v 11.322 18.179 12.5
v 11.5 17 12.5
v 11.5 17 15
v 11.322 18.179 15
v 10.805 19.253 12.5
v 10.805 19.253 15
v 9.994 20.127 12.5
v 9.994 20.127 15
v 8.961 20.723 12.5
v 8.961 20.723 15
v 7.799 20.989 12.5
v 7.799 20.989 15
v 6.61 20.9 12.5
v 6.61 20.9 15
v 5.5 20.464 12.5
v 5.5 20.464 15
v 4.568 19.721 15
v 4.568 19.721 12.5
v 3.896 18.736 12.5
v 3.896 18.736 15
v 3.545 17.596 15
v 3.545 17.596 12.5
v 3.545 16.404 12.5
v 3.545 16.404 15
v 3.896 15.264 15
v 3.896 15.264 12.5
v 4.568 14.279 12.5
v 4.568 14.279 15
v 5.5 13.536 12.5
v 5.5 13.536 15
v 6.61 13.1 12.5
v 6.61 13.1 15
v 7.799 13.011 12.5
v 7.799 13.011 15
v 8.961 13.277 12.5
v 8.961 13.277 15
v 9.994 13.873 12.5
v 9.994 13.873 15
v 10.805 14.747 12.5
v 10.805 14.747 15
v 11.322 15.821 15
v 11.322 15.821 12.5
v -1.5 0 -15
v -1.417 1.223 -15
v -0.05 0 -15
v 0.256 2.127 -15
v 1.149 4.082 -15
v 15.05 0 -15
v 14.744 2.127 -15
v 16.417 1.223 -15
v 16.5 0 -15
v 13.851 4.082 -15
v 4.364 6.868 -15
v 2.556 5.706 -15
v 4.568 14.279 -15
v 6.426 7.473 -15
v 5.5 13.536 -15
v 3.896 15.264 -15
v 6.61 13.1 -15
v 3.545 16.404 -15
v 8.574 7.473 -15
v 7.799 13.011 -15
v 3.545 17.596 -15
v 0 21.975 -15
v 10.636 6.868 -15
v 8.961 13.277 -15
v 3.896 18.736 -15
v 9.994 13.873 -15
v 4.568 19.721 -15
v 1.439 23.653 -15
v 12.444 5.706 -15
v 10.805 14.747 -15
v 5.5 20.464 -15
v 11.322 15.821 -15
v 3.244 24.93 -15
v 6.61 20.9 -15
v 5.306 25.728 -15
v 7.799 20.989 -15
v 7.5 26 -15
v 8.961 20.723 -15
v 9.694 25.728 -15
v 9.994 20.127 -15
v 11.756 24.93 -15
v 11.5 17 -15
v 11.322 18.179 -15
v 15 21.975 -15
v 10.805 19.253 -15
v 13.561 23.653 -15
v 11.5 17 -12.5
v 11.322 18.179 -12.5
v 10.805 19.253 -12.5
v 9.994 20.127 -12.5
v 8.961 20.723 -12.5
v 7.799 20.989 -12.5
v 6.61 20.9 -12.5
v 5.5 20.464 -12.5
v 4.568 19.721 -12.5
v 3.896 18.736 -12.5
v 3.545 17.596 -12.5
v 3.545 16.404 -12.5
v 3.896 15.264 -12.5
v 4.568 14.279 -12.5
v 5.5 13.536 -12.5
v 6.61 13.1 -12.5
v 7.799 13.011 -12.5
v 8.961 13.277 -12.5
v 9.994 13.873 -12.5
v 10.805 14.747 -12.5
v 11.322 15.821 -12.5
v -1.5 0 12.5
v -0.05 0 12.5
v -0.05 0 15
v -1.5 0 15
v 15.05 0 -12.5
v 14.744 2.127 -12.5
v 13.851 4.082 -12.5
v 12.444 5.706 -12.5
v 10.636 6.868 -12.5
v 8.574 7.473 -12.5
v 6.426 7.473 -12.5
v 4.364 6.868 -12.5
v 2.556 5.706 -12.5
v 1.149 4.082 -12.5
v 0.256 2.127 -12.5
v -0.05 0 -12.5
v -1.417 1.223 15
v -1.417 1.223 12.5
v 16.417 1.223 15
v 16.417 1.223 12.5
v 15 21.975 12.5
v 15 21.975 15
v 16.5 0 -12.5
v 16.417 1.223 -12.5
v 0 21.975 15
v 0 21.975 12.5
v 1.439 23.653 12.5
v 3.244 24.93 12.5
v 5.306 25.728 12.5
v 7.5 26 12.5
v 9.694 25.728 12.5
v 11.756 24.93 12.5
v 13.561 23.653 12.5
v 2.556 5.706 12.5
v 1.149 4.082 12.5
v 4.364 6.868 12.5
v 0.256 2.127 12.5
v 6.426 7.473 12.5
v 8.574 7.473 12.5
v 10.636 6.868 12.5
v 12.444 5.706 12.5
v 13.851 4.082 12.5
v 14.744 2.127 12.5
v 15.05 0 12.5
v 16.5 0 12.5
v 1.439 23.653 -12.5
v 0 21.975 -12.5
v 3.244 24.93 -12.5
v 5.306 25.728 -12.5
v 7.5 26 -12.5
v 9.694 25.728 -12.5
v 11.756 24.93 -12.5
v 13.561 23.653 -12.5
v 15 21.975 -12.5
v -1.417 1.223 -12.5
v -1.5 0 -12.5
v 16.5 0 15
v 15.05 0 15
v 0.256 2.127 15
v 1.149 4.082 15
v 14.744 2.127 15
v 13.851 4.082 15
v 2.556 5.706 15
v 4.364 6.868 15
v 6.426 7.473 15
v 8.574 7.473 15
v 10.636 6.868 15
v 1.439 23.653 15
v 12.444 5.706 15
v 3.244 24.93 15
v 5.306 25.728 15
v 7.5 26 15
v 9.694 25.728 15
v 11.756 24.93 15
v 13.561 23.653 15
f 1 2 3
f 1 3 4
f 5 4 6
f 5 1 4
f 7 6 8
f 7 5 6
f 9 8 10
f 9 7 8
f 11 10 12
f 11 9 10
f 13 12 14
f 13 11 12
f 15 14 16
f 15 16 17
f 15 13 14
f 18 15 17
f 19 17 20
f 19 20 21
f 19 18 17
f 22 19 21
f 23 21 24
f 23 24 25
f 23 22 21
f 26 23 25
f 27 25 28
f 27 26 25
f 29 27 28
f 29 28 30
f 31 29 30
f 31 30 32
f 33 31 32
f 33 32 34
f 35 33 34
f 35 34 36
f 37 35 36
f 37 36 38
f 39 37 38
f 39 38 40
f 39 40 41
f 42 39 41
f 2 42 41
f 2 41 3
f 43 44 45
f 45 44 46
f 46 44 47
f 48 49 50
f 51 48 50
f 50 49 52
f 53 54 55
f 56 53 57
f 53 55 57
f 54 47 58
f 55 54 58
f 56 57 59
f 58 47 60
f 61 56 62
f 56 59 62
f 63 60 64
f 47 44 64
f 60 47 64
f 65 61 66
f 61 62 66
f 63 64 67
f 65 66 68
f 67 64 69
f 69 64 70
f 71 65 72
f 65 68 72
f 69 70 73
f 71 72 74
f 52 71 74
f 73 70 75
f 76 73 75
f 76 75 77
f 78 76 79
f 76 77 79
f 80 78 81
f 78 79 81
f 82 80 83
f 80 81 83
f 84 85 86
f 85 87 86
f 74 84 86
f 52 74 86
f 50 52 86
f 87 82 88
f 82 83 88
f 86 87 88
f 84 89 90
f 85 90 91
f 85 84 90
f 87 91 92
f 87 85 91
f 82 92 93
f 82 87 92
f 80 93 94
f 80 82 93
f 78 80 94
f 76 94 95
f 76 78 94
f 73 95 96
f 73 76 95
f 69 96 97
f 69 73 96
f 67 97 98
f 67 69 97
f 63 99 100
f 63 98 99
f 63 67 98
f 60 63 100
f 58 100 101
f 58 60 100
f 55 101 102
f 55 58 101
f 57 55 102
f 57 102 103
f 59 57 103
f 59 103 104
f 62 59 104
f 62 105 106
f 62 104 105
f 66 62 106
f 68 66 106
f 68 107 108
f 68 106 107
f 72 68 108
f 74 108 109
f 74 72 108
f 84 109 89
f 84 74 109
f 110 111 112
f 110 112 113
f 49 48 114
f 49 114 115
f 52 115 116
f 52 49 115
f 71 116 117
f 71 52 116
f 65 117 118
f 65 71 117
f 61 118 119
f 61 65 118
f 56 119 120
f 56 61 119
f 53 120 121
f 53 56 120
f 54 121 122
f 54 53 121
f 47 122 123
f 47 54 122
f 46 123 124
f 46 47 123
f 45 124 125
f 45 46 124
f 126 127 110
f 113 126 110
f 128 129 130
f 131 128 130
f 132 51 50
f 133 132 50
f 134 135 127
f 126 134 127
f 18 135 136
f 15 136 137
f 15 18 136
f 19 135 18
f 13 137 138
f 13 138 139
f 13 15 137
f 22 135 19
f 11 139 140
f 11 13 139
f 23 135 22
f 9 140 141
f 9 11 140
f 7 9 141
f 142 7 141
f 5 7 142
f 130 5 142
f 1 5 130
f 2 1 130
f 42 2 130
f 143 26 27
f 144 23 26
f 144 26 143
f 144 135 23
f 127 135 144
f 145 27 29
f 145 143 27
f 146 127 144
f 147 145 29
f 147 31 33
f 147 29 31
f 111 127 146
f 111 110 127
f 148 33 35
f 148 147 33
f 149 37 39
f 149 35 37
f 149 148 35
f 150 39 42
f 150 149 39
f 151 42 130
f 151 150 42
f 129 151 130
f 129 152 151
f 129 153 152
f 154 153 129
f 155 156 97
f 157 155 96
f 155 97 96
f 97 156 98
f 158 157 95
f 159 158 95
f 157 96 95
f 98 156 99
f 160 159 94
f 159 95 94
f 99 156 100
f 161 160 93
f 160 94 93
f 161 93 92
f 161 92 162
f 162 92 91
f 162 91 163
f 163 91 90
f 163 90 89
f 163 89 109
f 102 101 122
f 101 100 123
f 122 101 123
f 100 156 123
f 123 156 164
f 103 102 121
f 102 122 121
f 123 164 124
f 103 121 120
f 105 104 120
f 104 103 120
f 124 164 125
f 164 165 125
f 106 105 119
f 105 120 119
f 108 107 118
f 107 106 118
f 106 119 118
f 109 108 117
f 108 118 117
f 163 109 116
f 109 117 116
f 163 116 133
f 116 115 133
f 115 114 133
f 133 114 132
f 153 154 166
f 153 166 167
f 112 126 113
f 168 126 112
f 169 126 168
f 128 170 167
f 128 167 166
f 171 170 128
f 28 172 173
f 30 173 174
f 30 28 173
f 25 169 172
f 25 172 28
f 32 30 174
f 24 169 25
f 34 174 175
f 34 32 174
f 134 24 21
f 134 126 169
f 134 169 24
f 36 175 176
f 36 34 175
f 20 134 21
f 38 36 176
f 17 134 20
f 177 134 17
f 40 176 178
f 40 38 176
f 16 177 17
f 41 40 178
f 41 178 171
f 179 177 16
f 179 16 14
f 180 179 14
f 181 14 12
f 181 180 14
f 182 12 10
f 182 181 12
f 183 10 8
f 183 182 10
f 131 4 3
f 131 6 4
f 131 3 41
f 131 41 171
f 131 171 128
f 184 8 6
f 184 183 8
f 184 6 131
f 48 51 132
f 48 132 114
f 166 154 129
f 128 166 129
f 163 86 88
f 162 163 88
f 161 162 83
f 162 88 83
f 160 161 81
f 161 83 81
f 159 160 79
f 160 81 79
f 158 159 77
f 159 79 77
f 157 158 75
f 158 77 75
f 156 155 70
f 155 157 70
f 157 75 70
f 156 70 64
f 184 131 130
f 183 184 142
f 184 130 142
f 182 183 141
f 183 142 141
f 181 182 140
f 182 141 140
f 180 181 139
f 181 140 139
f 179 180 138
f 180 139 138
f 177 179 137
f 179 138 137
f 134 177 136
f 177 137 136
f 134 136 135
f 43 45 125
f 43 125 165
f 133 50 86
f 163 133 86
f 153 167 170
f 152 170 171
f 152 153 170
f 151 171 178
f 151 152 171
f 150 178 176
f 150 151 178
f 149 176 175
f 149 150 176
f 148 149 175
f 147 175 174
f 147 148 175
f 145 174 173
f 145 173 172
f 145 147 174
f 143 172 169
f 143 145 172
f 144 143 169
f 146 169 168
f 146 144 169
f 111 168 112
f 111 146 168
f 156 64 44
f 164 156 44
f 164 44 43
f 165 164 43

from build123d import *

# Parameters (mm, degrees)
BOSS_EXTRUDE2_DEPTH      = 15
BOSS_EXTRUDE2_DEPTH_BACK = 15
SKETCH1_R                = 7.55
SKETCH1_R_2              = 4
CUT_EXTRUDE4_DEPTH       = 35.252737117
CUT_EXTRUDE4_DEPTH_BACK  = 35.252737117
SKETCH5_W                = 18
SKETCH5_H                = 25
CUT_EXTRUDE5_DEPTH       = 43.991278185
CUT_EXTRUDE5_DEPTH_BACK  = 43.991278185


with BuildPart() as part:
    # Sketch1 → Boss-Extrude2 (new, two sides: drawn at the far end of the back side and taken through both)
    with BuildSketch(Plane.XY.offset(-BOSS_EXTRUDE2_DEPTH_BACK)):
        with BuildLine():
            Line((-1.416520296, 1.222974164), (-1.5, 0))
            ThreePointArc((-1.5, 0), (7.5, -9), (16.5, 0))
            Line((16.5, 0), (16.416520296, 1.222974164))
            Line((16.416520296, 1.222974164), (15, 21.974937186))
            ThreePointArc((15, 21.974937186), (7.5, 26), (0, 21.974937186))
            Line((0, 21.974937186), (-1.416520296, 1.222974164))
        make_face()
        with Locations((7.5, 0)):
            Circle(SKETCH1_R, mode=Mode.SUBTRACT)
        with Locations((7.5, 17)):
            Circle(SKETCH1_R_2, mode=Mode.SUBTRACT)
    extrude(amount=BOSS_EXTRUDE2_DEPTH + BOSS_EXTRUDE2_DEPTH_BACK)

    # Sketch5 → Cut-Extrude4 (cut, two sides: drawn at the far end of the back side and taken through both)
    with BuildSketch(Plane(origin=(0, 0, 0), x_dir=(1, 0, 0), z_dir=(0, 1, 0)).offset(-CUT_EXTRUDE4_DEPTH_BACK)):
        with Locations((7.5, 0)):
            Rectangle(SKETCH5_W, SKETCH5_H)
    extrude(amount=CUT_EXTRUDE4_DEPTH + CUT_EXTRUDE4_DEPTH_BACK, mode=Mode.SUBTRACT)


with BuildPart() as cut_extrude4_piece_1:
    # of the separate pieces the step leaves, piece 1, a body of its own (cut_extrude4_pieces)
    add(part.part.solids().sort_by_distance((0, 21.974937186, -12.5))[0])


with BuildPart() as cut_extrude4_piece_2:
    # of the separate pieces the step leaves, piece 2, a body of its own (cut_extrude4_pieces)
    add(part.part.solids().sort_by_distance((0, 21.974937186, 15))[0])


with BuildPart() as cut_extrude5_tool:
    # Sketch6 → Cut-Extrude5 (new, two sides: drawn at the far end of the back side and taken through both)
    with BuildSketch(Plane.XY.offset(15).offset(-CUT_EXTRUDE5_DEPTH_BACK)):
        Polygon((7.5, 0), (-2.9473198, 0), (-2.9473198, -10.005342246), (19.305939863, -10.005342246), (19.305939863, 0), align=None)
    extrude(amount=CUT_EXTRUDE5_DEPTH + CUT_EXTRUDE5_DEPTH_BACK)


with BuildPart() as cut_extrude4_piece_1_1:
    add(cut_extrude4_piece_1.part)

    # Cut-Extrude5: cut by cut_extrude5_tool
    add(cut_extrude5_tool.part, mode=Mode.SUBTRACT)


with BuildPart() as cut_extrude4_piece_2_1:
    add(cut_extrude4_piece_2.part)

    # Cut-Extrude5: cut by cut_extrude5_tool
    add(cut_extrude5_tool.part, mode=Mode.SUBTRACT)


solid = Compound([cut_extrude4_piece_1_1.part, cut_extrude4_piece_2_1.part])
